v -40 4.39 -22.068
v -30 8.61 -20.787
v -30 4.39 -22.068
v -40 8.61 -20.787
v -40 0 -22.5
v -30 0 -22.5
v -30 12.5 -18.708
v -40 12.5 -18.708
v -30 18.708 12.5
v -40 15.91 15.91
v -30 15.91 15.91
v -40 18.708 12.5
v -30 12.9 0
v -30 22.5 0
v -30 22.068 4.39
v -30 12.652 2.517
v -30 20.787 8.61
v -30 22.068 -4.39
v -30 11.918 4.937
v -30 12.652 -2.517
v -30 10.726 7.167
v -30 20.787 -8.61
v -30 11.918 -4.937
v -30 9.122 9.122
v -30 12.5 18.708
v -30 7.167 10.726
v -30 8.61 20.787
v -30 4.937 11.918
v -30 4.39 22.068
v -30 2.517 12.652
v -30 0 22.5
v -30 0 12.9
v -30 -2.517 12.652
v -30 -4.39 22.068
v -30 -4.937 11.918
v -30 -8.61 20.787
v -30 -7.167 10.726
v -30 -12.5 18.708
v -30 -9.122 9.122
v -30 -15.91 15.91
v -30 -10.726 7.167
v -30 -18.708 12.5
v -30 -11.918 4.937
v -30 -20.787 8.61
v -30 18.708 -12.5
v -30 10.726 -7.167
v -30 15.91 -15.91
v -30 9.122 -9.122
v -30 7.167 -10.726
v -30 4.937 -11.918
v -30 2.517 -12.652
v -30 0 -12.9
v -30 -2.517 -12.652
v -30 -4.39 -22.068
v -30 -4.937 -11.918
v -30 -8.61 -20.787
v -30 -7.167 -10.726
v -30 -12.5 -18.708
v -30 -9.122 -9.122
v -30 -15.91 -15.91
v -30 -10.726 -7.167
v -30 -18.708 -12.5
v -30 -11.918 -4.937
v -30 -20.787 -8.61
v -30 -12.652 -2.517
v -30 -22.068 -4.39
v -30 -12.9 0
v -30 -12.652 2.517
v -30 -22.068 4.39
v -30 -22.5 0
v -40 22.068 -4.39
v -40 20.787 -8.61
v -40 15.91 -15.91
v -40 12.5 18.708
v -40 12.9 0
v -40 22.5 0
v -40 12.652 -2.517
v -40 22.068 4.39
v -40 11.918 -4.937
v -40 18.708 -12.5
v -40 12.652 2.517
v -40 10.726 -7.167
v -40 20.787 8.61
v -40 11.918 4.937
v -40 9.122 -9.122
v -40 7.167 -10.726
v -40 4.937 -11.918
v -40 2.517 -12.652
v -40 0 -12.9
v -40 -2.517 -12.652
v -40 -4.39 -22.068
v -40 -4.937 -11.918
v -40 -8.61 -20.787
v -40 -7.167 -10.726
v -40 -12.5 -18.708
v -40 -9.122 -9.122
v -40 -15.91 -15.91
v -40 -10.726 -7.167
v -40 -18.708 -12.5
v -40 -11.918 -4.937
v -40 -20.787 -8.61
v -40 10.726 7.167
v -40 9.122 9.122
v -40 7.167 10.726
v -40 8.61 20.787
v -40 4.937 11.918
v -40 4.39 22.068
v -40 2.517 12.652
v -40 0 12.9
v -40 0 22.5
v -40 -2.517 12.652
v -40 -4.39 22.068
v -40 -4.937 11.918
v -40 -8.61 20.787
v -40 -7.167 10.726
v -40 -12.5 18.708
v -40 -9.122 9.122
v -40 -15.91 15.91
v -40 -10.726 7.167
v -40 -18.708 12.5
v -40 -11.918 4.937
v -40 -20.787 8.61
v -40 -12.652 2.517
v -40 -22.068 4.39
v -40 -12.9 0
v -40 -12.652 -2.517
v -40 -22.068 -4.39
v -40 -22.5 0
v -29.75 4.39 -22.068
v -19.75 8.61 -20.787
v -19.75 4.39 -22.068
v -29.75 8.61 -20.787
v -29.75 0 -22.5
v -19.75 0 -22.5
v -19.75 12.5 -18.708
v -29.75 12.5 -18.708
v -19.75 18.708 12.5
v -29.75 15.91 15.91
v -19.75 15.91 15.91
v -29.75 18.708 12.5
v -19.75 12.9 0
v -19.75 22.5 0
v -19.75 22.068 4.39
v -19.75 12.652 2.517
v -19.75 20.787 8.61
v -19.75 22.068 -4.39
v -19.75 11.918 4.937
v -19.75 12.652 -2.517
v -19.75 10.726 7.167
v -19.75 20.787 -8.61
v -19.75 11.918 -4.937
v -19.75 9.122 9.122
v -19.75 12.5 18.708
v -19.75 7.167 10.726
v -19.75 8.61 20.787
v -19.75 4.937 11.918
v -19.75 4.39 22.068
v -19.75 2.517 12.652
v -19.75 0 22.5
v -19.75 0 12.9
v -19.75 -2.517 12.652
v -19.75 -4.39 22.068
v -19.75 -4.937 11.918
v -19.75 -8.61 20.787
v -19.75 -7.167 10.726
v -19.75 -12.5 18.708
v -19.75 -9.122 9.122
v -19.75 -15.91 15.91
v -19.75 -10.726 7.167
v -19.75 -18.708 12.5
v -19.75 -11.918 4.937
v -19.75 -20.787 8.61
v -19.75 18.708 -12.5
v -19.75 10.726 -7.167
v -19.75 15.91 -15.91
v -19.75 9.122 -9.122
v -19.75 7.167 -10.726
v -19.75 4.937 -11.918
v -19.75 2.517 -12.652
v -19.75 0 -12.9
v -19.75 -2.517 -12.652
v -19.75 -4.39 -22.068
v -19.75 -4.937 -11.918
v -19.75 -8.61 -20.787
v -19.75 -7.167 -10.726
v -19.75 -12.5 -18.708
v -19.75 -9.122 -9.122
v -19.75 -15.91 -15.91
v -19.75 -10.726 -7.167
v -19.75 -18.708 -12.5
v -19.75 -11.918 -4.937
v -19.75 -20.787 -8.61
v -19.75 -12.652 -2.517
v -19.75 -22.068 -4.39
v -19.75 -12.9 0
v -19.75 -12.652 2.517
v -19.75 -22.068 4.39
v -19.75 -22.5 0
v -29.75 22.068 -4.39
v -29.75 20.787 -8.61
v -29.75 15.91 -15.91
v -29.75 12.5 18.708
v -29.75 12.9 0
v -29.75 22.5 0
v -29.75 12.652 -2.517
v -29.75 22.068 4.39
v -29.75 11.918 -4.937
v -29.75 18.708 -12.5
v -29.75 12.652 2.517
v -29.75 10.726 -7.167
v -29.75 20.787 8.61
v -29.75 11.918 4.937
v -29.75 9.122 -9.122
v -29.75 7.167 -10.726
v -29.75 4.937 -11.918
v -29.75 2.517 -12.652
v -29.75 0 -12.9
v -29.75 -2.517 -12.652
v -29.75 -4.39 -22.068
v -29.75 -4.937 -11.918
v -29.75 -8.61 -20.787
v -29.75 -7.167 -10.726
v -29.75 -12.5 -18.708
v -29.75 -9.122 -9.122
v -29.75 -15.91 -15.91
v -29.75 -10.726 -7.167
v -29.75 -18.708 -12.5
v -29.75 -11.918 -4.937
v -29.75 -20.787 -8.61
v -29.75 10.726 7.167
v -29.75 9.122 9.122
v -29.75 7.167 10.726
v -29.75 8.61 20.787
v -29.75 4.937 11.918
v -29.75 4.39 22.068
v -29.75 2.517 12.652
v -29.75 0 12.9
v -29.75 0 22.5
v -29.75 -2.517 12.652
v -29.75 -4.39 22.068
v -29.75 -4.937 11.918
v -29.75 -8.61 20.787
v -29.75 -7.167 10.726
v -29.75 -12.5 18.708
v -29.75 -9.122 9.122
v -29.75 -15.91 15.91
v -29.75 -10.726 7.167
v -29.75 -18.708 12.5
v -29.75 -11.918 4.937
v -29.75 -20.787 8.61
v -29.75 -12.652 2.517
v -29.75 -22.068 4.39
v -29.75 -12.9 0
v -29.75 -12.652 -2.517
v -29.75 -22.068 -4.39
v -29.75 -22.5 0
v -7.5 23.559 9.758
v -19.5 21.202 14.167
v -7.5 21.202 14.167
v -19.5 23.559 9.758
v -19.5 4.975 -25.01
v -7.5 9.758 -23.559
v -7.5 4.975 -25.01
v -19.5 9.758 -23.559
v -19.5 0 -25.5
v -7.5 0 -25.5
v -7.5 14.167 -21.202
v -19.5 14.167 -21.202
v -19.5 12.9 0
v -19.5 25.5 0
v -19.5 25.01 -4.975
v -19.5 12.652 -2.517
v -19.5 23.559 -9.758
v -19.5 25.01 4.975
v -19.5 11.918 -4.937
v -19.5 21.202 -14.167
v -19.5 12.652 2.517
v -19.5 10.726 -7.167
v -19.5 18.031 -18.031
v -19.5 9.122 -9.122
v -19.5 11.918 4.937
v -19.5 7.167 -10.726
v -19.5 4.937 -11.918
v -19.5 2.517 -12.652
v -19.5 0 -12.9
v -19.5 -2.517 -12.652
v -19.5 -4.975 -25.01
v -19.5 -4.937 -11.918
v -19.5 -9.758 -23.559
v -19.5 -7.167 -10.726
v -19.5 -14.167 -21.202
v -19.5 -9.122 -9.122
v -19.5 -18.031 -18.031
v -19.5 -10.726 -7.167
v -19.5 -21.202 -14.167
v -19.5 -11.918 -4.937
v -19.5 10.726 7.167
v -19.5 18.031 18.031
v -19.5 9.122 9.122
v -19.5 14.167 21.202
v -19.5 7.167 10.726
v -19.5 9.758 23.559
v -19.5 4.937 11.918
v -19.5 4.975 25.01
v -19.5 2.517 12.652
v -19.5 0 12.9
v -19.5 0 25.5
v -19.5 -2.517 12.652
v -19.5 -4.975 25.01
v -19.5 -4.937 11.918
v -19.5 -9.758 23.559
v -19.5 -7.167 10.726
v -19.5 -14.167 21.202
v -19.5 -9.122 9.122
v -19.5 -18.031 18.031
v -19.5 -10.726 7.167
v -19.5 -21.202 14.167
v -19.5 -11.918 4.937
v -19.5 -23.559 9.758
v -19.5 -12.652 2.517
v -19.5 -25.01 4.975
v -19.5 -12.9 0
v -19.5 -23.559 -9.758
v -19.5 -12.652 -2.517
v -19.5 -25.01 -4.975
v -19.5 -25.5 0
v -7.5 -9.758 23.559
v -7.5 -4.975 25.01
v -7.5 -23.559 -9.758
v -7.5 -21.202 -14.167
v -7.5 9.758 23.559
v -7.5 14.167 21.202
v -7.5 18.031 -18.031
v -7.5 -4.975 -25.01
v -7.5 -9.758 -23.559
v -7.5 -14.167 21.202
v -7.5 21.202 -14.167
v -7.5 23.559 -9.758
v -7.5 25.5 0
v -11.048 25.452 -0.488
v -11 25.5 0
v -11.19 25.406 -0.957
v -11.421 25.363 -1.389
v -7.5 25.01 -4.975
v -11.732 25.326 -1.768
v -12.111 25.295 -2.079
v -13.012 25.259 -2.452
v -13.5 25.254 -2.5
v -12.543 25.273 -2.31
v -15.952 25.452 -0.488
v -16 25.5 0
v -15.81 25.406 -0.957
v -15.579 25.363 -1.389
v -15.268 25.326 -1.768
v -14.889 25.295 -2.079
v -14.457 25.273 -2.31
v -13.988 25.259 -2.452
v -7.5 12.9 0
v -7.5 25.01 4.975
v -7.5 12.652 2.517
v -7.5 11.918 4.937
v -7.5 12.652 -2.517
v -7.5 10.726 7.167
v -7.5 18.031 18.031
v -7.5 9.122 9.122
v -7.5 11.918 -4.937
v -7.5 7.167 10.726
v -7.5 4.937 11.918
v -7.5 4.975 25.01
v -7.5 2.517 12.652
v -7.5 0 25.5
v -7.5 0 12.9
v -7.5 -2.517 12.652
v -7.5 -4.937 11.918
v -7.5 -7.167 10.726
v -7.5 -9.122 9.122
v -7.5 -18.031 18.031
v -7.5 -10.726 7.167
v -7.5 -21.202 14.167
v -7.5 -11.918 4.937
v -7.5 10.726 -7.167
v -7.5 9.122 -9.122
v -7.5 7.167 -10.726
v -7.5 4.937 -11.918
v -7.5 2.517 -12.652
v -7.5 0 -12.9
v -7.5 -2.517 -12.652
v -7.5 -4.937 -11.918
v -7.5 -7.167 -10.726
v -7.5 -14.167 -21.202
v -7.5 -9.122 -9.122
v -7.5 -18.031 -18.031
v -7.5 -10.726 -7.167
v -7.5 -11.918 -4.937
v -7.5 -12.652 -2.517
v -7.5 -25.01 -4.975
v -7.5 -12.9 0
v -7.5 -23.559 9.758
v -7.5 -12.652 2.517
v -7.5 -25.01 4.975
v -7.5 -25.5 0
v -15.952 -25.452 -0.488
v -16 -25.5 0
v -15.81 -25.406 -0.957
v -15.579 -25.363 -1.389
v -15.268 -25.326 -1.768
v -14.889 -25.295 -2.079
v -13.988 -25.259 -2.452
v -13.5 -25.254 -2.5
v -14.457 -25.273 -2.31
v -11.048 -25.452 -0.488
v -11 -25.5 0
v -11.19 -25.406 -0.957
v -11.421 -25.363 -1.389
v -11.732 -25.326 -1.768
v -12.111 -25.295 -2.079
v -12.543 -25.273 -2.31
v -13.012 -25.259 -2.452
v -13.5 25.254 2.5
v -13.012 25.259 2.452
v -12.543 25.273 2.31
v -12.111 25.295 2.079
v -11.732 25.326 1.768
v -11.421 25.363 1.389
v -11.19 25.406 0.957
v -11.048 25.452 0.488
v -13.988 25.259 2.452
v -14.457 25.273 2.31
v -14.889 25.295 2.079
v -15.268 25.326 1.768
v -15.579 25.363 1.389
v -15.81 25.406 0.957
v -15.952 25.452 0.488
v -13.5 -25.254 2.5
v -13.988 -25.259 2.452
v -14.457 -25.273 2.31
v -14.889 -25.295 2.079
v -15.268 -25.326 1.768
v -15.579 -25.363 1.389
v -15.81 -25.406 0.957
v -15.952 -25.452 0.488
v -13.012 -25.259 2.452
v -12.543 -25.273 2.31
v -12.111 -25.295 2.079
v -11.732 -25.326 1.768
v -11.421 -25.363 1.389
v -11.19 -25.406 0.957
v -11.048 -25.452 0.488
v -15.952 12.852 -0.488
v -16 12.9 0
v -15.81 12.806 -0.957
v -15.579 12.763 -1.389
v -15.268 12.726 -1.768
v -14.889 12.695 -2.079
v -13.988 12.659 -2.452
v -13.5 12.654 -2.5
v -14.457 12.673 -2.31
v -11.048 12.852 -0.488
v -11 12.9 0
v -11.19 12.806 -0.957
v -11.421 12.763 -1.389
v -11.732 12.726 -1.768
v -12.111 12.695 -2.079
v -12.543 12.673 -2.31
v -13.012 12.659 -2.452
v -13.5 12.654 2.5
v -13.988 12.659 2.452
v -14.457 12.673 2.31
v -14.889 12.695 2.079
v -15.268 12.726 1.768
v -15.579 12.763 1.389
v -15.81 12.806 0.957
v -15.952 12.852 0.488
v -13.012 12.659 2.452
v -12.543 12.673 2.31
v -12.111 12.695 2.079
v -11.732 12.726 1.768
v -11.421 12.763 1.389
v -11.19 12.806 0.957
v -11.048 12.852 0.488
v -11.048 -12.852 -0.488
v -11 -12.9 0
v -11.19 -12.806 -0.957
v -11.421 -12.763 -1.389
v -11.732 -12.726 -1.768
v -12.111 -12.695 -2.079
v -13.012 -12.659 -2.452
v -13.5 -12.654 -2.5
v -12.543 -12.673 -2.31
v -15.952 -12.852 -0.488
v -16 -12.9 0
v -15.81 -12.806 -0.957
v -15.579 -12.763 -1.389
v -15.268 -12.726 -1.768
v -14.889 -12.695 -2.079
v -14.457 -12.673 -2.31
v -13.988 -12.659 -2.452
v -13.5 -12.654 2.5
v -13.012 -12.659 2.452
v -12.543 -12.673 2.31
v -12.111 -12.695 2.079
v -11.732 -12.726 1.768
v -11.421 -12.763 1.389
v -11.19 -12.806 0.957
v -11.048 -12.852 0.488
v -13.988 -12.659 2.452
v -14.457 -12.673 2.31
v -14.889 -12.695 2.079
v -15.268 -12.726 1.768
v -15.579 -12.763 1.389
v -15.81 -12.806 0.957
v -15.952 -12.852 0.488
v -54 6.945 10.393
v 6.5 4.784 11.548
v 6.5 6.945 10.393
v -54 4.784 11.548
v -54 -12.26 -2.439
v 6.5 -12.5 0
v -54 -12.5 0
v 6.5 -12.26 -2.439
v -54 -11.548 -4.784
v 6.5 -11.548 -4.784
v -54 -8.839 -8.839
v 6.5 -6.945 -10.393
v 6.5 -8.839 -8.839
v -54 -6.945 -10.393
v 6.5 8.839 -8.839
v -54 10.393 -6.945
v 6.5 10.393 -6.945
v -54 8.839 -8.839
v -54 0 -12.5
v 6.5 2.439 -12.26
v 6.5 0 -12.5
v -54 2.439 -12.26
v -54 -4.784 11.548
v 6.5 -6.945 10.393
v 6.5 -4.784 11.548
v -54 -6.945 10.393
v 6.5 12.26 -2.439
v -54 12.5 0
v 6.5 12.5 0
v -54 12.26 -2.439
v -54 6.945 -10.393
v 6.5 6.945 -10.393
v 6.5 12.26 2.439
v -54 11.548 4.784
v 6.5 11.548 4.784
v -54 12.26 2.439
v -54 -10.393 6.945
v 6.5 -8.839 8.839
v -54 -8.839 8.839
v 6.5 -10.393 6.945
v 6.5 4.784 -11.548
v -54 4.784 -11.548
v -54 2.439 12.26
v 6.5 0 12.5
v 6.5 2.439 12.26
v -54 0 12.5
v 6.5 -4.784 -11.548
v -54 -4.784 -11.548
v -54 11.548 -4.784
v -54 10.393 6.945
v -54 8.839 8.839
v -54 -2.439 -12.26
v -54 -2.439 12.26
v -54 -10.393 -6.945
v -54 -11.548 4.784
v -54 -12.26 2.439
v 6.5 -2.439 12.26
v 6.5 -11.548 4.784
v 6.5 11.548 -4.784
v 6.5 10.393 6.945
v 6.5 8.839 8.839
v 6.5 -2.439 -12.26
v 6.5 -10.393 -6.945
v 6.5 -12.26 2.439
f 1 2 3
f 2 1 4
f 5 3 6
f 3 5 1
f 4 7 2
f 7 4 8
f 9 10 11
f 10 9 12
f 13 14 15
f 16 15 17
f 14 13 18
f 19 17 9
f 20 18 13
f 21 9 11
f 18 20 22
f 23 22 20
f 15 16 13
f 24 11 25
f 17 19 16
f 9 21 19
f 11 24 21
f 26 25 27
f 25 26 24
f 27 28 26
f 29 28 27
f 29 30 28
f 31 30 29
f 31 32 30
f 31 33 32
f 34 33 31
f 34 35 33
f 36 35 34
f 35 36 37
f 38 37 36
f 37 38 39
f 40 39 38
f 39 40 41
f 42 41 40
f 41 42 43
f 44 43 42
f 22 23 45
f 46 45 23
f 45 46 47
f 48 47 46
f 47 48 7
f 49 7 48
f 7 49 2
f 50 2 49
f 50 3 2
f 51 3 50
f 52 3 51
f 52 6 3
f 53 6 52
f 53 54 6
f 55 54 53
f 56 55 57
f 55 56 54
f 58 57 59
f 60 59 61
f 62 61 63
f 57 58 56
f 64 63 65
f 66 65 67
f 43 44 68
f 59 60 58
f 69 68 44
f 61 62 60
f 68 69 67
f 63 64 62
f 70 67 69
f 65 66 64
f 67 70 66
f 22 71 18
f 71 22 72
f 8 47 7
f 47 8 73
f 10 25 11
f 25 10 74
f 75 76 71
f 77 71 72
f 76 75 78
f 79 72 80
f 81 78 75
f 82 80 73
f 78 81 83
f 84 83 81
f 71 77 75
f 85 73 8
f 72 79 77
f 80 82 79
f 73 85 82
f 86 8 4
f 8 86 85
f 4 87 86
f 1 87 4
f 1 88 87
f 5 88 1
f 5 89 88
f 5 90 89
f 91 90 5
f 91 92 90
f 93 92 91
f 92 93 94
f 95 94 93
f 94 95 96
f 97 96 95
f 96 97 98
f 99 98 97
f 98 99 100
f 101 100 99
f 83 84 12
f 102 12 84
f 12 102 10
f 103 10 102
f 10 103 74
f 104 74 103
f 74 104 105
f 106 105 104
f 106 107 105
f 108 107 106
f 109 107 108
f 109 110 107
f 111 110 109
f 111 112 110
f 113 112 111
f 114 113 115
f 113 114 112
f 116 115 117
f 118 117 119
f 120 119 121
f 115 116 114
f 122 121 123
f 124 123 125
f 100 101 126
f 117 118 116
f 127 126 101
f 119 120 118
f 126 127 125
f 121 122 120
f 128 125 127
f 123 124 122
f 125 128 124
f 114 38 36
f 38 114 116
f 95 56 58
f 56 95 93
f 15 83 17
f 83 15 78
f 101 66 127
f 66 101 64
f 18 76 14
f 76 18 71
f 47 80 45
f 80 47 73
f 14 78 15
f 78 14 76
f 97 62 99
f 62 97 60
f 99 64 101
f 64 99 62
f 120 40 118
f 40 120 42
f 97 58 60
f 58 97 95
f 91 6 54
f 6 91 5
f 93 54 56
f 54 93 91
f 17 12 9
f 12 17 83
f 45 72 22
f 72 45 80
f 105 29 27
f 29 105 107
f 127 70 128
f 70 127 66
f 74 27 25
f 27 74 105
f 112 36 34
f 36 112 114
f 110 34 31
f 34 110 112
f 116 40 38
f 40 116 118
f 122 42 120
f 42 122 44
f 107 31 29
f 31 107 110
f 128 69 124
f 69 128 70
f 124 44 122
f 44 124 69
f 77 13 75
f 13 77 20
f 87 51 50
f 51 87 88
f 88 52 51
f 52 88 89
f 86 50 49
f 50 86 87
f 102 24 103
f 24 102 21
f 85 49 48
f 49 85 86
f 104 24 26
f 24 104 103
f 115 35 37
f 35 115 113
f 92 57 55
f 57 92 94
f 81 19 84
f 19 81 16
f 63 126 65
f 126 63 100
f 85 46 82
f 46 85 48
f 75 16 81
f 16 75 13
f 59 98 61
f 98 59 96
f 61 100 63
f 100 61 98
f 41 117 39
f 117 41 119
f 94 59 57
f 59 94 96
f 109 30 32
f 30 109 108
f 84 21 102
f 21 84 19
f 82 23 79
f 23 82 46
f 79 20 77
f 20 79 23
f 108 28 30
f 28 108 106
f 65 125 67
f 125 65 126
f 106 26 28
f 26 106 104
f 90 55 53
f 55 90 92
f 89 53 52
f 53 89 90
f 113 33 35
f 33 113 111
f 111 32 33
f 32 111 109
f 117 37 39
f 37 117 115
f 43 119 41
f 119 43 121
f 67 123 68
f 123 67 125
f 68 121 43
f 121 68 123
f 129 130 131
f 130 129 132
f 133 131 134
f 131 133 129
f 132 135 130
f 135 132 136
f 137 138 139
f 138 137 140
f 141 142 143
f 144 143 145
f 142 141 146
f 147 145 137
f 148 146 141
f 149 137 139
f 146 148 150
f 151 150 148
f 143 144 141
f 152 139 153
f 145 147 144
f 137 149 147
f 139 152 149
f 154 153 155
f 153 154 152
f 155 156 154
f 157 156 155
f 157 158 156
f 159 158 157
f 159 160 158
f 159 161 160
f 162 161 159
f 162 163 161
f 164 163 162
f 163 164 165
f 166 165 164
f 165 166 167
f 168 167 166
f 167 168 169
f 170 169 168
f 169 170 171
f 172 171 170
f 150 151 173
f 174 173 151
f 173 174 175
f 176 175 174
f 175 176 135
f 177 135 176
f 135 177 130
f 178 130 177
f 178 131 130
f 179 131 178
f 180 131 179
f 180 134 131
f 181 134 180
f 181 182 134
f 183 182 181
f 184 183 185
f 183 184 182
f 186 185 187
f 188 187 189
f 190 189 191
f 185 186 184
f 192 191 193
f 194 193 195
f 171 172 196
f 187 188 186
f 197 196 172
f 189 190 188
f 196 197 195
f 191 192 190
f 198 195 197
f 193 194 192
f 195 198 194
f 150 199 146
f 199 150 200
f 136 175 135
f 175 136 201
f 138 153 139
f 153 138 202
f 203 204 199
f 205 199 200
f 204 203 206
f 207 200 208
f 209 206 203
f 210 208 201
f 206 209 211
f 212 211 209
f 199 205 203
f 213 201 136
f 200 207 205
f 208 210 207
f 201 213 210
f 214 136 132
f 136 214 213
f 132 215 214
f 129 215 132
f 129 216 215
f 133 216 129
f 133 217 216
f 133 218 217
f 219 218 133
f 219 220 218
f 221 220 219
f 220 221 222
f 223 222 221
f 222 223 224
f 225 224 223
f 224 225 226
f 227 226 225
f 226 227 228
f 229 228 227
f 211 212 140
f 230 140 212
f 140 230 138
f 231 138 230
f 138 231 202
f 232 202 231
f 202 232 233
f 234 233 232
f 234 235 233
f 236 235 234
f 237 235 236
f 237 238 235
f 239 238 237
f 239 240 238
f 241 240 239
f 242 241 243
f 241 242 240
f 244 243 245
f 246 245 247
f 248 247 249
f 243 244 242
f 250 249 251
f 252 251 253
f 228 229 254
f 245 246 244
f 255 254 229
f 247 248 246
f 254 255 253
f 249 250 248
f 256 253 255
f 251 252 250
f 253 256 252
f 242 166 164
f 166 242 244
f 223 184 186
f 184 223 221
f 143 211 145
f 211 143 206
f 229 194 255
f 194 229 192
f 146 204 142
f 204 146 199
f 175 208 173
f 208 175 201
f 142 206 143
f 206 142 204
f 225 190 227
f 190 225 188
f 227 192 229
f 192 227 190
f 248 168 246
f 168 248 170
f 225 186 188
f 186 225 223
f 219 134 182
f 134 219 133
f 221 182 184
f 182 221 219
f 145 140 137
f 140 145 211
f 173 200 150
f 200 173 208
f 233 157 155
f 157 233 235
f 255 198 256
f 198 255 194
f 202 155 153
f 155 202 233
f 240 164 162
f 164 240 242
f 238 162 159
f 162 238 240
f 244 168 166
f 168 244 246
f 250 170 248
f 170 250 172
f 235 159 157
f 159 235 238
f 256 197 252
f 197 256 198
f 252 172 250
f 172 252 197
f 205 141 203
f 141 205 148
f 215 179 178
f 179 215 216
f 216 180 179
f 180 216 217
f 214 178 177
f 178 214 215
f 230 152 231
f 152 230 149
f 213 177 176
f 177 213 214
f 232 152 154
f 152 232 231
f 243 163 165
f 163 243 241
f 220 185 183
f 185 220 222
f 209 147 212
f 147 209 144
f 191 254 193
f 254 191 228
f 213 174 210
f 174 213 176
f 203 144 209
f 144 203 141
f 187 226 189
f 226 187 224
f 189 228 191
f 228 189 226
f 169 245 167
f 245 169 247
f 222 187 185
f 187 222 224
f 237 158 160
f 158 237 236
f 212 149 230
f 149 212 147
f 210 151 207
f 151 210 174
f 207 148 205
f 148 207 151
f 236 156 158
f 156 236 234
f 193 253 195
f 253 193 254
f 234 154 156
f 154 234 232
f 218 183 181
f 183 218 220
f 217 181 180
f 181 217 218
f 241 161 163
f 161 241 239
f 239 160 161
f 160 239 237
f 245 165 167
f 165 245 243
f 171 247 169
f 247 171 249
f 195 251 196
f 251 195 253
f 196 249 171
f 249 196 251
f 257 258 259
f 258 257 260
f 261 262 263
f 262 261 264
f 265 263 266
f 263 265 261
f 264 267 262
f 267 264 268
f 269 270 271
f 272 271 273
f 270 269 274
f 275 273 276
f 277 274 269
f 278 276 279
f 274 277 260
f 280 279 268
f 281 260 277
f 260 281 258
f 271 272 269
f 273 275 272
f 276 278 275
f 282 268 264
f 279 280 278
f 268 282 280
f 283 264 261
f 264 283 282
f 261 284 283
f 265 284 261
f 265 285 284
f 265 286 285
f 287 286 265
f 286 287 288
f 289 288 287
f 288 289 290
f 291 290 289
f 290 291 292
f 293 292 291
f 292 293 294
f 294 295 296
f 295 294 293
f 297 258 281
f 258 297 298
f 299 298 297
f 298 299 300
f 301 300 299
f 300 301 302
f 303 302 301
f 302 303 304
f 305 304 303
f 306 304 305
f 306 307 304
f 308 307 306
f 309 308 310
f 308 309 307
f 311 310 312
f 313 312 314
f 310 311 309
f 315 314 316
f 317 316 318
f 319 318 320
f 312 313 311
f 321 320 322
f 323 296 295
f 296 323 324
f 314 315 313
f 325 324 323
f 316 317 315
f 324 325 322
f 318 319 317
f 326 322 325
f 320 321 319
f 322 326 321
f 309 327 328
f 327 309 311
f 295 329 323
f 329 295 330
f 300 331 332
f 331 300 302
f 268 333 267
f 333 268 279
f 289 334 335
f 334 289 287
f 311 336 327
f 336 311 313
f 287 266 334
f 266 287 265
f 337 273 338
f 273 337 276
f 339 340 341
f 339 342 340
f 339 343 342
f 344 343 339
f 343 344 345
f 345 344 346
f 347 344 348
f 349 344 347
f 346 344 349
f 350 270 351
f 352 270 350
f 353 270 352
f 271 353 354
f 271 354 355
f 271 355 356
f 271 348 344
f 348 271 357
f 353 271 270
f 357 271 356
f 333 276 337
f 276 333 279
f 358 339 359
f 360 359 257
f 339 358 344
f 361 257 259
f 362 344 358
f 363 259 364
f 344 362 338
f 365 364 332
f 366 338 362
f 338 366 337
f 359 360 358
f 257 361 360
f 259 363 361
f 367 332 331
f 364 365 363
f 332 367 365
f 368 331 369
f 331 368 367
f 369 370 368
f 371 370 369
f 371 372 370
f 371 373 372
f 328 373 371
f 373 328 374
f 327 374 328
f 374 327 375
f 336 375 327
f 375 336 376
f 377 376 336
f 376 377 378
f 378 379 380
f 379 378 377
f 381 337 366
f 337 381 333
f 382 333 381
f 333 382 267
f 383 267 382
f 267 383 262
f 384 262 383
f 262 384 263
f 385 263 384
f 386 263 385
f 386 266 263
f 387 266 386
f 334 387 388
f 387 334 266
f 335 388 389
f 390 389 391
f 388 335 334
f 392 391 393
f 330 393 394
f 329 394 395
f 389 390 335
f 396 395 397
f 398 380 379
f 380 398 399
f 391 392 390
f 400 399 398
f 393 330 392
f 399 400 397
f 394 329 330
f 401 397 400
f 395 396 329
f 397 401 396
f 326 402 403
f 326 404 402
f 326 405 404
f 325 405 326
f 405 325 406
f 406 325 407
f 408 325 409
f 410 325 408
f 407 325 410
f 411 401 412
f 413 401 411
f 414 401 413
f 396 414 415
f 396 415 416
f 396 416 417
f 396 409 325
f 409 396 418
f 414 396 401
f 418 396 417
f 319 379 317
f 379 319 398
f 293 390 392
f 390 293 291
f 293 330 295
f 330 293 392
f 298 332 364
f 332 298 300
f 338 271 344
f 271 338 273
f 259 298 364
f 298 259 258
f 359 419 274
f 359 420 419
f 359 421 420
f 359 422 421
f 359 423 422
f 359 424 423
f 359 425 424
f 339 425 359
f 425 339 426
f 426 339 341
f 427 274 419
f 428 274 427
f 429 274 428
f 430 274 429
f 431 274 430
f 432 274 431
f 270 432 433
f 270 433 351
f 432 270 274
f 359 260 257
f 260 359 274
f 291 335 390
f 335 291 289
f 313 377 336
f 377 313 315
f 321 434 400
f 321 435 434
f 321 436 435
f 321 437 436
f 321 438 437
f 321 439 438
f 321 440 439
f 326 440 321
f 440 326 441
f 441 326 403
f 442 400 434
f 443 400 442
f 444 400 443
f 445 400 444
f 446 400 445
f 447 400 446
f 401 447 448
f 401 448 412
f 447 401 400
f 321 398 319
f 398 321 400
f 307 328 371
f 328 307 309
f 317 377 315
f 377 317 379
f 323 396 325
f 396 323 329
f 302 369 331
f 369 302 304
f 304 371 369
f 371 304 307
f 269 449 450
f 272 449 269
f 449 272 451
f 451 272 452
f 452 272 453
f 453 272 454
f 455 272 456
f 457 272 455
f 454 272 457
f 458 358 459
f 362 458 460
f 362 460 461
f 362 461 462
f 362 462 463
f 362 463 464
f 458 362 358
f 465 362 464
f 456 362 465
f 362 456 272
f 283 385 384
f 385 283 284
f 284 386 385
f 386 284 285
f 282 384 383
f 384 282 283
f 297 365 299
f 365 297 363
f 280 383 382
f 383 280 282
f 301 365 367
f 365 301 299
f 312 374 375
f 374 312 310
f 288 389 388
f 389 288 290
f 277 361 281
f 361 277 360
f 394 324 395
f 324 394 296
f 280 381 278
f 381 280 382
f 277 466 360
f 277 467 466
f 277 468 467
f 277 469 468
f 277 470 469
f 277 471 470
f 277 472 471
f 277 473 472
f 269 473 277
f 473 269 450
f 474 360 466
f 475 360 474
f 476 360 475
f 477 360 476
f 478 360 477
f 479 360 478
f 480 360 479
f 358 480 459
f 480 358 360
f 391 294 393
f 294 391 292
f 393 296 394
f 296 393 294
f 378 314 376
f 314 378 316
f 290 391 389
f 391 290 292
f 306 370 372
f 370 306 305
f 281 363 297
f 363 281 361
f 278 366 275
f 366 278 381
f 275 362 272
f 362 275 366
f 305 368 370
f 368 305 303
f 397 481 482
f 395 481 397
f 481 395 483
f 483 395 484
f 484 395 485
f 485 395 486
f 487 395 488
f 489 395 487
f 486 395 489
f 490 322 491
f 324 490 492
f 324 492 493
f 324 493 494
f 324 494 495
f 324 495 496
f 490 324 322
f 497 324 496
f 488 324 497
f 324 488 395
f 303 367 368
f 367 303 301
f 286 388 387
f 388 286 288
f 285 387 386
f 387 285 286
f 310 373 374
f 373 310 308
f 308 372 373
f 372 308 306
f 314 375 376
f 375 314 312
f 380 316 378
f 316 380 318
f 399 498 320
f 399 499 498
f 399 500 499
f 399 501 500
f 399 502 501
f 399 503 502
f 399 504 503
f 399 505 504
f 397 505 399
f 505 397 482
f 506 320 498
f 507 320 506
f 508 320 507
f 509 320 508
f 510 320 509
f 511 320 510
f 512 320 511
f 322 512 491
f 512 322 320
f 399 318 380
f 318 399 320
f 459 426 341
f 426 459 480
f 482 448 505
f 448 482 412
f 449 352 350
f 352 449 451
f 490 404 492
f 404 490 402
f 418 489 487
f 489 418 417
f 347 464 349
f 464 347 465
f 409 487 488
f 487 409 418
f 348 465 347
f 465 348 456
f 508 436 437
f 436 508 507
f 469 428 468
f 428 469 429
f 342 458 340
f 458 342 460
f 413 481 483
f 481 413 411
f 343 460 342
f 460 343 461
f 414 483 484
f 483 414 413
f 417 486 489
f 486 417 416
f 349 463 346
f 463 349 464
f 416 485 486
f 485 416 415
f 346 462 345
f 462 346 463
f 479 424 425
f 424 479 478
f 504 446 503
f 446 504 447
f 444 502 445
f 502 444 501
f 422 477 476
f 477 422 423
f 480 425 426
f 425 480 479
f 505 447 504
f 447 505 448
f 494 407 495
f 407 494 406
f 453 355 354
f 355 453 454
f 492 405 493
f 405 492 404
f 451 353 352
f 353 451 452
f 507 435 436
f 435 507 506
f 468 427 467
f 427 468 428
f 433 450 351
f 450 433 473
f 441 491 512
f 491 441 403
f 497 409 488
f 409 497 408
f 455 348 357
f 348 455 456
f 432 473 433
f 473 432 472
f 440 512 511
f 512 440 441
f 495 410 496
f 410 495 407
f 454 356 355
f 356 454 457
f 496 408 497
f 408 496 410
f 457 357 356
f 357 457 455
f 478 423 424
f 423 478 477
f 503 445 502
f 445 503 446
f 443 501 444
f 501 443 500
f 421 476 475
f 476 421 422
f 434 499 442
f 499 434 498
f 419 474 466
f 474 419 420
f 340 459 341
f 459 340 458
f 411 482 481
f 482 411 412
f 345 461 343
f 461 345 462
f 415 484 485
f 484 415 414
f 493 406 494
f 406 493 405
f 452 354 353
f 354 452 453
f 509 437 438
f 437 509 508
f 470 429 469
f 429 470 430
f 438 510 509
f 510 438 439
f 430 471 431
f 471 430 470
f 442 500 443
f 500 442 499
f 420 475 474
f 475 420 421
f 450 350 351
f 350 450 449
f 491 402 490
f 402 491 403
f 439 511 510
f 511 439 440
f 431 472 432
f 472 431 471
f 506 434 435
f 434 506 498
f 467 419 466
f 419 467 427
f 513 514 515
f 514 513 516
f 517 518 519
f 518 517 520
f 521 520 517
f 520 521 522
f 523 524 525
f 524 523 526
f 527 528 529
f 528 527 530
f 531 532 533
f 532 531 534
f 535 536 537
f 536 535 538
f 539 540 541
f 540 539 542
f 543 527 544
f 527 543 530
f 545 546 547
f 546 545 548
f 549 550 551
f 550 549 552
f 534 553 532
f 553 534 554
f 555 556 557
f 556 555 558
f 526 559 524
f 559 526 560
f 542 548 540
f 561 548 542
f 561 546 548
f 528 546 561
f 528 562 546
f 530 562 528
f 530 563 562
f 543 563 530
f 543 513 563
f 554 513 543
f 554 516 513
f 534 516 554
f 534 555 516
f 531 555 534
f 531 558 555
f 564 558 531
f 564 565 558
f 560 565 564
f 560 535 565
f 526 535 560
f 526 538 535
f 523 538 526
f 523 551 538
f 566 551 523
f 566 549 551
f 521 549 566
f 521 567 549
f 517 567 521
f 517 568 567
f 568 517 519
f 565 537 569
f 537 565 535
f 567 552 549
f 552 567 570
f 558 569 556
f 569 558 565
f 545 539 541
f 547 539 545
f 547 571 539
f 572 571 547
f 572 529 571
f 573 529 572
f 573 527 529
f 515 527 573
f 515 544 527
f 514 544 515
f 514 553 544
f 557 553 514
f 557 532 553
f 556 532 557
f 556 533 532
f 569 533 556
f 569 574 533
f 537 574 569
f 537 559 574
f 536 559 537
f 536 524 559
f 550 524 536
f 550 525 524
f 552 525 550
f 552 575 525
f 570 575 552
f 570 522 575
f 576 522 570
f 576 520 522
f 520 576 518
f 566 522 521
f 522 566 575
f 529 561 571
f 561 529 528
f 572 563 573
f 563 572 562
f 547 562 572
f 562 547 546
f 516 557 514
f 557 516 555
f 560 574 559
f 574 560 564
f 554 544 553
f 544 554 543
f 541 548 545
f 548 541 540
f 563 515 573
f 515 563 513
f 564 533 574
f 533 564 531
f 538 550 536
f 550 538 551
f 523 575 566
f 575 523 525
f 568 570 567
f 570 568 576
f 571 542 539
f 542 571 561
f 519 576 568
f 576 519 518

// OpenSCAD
$fn = 32;

// ------------------------------------------------------------------------
// Shaft with rings and collars: d25 shaft, 3 rings
// Every part is its own module, assembly() places them once.
// ------------------------------------------------------------------------

// --- part 1 ---
module shaft() {
  translate([0, 0, -30.25]) cylinder(h = 60.5, d = 25);
}

// --- part 2 ---
module spacer_a() {
  difference() {
      translate([0, 0, 0]) cylinder(h = 10, d = 45);
      translate([0, 0, -1]) cylinder(h = 12, d = 25.8);
    }
}

// --- part 3 ---
module spacer_b() {
  difference() {
      translate([0, 0, 0]) cylinder(h = 10, d = 45);
      translate([0, 0, -1]) cylinder(h = 12, d = 25.8);
    }
}

// --- part 4 ---
module collar_a() {
  difference() {
    cylinder(h = 12, d = 51);
    translate([0, 0, -1]) cylinder(h = 14, d = 25.8);
    translate([0, 0, 6]) rotate([90, 0, 0]) cylinder(h = 53, d = 5, center = true);
  }
}

// --- assembly ---
module assembly() {
  translate([-23.75, 0, 0]) rotate([0, 90, 0]) shaft();
  translate([-40, 0, 0]) rotate([0, 90, 0]) spacer_a();
  translate([-29.75, 0, 0]) rotate([0, 90, 0]) spacer_b();
  translate([-19.5, 0, 0]) rotate([0, 90, 0]) collar_a();
}

assembly();
